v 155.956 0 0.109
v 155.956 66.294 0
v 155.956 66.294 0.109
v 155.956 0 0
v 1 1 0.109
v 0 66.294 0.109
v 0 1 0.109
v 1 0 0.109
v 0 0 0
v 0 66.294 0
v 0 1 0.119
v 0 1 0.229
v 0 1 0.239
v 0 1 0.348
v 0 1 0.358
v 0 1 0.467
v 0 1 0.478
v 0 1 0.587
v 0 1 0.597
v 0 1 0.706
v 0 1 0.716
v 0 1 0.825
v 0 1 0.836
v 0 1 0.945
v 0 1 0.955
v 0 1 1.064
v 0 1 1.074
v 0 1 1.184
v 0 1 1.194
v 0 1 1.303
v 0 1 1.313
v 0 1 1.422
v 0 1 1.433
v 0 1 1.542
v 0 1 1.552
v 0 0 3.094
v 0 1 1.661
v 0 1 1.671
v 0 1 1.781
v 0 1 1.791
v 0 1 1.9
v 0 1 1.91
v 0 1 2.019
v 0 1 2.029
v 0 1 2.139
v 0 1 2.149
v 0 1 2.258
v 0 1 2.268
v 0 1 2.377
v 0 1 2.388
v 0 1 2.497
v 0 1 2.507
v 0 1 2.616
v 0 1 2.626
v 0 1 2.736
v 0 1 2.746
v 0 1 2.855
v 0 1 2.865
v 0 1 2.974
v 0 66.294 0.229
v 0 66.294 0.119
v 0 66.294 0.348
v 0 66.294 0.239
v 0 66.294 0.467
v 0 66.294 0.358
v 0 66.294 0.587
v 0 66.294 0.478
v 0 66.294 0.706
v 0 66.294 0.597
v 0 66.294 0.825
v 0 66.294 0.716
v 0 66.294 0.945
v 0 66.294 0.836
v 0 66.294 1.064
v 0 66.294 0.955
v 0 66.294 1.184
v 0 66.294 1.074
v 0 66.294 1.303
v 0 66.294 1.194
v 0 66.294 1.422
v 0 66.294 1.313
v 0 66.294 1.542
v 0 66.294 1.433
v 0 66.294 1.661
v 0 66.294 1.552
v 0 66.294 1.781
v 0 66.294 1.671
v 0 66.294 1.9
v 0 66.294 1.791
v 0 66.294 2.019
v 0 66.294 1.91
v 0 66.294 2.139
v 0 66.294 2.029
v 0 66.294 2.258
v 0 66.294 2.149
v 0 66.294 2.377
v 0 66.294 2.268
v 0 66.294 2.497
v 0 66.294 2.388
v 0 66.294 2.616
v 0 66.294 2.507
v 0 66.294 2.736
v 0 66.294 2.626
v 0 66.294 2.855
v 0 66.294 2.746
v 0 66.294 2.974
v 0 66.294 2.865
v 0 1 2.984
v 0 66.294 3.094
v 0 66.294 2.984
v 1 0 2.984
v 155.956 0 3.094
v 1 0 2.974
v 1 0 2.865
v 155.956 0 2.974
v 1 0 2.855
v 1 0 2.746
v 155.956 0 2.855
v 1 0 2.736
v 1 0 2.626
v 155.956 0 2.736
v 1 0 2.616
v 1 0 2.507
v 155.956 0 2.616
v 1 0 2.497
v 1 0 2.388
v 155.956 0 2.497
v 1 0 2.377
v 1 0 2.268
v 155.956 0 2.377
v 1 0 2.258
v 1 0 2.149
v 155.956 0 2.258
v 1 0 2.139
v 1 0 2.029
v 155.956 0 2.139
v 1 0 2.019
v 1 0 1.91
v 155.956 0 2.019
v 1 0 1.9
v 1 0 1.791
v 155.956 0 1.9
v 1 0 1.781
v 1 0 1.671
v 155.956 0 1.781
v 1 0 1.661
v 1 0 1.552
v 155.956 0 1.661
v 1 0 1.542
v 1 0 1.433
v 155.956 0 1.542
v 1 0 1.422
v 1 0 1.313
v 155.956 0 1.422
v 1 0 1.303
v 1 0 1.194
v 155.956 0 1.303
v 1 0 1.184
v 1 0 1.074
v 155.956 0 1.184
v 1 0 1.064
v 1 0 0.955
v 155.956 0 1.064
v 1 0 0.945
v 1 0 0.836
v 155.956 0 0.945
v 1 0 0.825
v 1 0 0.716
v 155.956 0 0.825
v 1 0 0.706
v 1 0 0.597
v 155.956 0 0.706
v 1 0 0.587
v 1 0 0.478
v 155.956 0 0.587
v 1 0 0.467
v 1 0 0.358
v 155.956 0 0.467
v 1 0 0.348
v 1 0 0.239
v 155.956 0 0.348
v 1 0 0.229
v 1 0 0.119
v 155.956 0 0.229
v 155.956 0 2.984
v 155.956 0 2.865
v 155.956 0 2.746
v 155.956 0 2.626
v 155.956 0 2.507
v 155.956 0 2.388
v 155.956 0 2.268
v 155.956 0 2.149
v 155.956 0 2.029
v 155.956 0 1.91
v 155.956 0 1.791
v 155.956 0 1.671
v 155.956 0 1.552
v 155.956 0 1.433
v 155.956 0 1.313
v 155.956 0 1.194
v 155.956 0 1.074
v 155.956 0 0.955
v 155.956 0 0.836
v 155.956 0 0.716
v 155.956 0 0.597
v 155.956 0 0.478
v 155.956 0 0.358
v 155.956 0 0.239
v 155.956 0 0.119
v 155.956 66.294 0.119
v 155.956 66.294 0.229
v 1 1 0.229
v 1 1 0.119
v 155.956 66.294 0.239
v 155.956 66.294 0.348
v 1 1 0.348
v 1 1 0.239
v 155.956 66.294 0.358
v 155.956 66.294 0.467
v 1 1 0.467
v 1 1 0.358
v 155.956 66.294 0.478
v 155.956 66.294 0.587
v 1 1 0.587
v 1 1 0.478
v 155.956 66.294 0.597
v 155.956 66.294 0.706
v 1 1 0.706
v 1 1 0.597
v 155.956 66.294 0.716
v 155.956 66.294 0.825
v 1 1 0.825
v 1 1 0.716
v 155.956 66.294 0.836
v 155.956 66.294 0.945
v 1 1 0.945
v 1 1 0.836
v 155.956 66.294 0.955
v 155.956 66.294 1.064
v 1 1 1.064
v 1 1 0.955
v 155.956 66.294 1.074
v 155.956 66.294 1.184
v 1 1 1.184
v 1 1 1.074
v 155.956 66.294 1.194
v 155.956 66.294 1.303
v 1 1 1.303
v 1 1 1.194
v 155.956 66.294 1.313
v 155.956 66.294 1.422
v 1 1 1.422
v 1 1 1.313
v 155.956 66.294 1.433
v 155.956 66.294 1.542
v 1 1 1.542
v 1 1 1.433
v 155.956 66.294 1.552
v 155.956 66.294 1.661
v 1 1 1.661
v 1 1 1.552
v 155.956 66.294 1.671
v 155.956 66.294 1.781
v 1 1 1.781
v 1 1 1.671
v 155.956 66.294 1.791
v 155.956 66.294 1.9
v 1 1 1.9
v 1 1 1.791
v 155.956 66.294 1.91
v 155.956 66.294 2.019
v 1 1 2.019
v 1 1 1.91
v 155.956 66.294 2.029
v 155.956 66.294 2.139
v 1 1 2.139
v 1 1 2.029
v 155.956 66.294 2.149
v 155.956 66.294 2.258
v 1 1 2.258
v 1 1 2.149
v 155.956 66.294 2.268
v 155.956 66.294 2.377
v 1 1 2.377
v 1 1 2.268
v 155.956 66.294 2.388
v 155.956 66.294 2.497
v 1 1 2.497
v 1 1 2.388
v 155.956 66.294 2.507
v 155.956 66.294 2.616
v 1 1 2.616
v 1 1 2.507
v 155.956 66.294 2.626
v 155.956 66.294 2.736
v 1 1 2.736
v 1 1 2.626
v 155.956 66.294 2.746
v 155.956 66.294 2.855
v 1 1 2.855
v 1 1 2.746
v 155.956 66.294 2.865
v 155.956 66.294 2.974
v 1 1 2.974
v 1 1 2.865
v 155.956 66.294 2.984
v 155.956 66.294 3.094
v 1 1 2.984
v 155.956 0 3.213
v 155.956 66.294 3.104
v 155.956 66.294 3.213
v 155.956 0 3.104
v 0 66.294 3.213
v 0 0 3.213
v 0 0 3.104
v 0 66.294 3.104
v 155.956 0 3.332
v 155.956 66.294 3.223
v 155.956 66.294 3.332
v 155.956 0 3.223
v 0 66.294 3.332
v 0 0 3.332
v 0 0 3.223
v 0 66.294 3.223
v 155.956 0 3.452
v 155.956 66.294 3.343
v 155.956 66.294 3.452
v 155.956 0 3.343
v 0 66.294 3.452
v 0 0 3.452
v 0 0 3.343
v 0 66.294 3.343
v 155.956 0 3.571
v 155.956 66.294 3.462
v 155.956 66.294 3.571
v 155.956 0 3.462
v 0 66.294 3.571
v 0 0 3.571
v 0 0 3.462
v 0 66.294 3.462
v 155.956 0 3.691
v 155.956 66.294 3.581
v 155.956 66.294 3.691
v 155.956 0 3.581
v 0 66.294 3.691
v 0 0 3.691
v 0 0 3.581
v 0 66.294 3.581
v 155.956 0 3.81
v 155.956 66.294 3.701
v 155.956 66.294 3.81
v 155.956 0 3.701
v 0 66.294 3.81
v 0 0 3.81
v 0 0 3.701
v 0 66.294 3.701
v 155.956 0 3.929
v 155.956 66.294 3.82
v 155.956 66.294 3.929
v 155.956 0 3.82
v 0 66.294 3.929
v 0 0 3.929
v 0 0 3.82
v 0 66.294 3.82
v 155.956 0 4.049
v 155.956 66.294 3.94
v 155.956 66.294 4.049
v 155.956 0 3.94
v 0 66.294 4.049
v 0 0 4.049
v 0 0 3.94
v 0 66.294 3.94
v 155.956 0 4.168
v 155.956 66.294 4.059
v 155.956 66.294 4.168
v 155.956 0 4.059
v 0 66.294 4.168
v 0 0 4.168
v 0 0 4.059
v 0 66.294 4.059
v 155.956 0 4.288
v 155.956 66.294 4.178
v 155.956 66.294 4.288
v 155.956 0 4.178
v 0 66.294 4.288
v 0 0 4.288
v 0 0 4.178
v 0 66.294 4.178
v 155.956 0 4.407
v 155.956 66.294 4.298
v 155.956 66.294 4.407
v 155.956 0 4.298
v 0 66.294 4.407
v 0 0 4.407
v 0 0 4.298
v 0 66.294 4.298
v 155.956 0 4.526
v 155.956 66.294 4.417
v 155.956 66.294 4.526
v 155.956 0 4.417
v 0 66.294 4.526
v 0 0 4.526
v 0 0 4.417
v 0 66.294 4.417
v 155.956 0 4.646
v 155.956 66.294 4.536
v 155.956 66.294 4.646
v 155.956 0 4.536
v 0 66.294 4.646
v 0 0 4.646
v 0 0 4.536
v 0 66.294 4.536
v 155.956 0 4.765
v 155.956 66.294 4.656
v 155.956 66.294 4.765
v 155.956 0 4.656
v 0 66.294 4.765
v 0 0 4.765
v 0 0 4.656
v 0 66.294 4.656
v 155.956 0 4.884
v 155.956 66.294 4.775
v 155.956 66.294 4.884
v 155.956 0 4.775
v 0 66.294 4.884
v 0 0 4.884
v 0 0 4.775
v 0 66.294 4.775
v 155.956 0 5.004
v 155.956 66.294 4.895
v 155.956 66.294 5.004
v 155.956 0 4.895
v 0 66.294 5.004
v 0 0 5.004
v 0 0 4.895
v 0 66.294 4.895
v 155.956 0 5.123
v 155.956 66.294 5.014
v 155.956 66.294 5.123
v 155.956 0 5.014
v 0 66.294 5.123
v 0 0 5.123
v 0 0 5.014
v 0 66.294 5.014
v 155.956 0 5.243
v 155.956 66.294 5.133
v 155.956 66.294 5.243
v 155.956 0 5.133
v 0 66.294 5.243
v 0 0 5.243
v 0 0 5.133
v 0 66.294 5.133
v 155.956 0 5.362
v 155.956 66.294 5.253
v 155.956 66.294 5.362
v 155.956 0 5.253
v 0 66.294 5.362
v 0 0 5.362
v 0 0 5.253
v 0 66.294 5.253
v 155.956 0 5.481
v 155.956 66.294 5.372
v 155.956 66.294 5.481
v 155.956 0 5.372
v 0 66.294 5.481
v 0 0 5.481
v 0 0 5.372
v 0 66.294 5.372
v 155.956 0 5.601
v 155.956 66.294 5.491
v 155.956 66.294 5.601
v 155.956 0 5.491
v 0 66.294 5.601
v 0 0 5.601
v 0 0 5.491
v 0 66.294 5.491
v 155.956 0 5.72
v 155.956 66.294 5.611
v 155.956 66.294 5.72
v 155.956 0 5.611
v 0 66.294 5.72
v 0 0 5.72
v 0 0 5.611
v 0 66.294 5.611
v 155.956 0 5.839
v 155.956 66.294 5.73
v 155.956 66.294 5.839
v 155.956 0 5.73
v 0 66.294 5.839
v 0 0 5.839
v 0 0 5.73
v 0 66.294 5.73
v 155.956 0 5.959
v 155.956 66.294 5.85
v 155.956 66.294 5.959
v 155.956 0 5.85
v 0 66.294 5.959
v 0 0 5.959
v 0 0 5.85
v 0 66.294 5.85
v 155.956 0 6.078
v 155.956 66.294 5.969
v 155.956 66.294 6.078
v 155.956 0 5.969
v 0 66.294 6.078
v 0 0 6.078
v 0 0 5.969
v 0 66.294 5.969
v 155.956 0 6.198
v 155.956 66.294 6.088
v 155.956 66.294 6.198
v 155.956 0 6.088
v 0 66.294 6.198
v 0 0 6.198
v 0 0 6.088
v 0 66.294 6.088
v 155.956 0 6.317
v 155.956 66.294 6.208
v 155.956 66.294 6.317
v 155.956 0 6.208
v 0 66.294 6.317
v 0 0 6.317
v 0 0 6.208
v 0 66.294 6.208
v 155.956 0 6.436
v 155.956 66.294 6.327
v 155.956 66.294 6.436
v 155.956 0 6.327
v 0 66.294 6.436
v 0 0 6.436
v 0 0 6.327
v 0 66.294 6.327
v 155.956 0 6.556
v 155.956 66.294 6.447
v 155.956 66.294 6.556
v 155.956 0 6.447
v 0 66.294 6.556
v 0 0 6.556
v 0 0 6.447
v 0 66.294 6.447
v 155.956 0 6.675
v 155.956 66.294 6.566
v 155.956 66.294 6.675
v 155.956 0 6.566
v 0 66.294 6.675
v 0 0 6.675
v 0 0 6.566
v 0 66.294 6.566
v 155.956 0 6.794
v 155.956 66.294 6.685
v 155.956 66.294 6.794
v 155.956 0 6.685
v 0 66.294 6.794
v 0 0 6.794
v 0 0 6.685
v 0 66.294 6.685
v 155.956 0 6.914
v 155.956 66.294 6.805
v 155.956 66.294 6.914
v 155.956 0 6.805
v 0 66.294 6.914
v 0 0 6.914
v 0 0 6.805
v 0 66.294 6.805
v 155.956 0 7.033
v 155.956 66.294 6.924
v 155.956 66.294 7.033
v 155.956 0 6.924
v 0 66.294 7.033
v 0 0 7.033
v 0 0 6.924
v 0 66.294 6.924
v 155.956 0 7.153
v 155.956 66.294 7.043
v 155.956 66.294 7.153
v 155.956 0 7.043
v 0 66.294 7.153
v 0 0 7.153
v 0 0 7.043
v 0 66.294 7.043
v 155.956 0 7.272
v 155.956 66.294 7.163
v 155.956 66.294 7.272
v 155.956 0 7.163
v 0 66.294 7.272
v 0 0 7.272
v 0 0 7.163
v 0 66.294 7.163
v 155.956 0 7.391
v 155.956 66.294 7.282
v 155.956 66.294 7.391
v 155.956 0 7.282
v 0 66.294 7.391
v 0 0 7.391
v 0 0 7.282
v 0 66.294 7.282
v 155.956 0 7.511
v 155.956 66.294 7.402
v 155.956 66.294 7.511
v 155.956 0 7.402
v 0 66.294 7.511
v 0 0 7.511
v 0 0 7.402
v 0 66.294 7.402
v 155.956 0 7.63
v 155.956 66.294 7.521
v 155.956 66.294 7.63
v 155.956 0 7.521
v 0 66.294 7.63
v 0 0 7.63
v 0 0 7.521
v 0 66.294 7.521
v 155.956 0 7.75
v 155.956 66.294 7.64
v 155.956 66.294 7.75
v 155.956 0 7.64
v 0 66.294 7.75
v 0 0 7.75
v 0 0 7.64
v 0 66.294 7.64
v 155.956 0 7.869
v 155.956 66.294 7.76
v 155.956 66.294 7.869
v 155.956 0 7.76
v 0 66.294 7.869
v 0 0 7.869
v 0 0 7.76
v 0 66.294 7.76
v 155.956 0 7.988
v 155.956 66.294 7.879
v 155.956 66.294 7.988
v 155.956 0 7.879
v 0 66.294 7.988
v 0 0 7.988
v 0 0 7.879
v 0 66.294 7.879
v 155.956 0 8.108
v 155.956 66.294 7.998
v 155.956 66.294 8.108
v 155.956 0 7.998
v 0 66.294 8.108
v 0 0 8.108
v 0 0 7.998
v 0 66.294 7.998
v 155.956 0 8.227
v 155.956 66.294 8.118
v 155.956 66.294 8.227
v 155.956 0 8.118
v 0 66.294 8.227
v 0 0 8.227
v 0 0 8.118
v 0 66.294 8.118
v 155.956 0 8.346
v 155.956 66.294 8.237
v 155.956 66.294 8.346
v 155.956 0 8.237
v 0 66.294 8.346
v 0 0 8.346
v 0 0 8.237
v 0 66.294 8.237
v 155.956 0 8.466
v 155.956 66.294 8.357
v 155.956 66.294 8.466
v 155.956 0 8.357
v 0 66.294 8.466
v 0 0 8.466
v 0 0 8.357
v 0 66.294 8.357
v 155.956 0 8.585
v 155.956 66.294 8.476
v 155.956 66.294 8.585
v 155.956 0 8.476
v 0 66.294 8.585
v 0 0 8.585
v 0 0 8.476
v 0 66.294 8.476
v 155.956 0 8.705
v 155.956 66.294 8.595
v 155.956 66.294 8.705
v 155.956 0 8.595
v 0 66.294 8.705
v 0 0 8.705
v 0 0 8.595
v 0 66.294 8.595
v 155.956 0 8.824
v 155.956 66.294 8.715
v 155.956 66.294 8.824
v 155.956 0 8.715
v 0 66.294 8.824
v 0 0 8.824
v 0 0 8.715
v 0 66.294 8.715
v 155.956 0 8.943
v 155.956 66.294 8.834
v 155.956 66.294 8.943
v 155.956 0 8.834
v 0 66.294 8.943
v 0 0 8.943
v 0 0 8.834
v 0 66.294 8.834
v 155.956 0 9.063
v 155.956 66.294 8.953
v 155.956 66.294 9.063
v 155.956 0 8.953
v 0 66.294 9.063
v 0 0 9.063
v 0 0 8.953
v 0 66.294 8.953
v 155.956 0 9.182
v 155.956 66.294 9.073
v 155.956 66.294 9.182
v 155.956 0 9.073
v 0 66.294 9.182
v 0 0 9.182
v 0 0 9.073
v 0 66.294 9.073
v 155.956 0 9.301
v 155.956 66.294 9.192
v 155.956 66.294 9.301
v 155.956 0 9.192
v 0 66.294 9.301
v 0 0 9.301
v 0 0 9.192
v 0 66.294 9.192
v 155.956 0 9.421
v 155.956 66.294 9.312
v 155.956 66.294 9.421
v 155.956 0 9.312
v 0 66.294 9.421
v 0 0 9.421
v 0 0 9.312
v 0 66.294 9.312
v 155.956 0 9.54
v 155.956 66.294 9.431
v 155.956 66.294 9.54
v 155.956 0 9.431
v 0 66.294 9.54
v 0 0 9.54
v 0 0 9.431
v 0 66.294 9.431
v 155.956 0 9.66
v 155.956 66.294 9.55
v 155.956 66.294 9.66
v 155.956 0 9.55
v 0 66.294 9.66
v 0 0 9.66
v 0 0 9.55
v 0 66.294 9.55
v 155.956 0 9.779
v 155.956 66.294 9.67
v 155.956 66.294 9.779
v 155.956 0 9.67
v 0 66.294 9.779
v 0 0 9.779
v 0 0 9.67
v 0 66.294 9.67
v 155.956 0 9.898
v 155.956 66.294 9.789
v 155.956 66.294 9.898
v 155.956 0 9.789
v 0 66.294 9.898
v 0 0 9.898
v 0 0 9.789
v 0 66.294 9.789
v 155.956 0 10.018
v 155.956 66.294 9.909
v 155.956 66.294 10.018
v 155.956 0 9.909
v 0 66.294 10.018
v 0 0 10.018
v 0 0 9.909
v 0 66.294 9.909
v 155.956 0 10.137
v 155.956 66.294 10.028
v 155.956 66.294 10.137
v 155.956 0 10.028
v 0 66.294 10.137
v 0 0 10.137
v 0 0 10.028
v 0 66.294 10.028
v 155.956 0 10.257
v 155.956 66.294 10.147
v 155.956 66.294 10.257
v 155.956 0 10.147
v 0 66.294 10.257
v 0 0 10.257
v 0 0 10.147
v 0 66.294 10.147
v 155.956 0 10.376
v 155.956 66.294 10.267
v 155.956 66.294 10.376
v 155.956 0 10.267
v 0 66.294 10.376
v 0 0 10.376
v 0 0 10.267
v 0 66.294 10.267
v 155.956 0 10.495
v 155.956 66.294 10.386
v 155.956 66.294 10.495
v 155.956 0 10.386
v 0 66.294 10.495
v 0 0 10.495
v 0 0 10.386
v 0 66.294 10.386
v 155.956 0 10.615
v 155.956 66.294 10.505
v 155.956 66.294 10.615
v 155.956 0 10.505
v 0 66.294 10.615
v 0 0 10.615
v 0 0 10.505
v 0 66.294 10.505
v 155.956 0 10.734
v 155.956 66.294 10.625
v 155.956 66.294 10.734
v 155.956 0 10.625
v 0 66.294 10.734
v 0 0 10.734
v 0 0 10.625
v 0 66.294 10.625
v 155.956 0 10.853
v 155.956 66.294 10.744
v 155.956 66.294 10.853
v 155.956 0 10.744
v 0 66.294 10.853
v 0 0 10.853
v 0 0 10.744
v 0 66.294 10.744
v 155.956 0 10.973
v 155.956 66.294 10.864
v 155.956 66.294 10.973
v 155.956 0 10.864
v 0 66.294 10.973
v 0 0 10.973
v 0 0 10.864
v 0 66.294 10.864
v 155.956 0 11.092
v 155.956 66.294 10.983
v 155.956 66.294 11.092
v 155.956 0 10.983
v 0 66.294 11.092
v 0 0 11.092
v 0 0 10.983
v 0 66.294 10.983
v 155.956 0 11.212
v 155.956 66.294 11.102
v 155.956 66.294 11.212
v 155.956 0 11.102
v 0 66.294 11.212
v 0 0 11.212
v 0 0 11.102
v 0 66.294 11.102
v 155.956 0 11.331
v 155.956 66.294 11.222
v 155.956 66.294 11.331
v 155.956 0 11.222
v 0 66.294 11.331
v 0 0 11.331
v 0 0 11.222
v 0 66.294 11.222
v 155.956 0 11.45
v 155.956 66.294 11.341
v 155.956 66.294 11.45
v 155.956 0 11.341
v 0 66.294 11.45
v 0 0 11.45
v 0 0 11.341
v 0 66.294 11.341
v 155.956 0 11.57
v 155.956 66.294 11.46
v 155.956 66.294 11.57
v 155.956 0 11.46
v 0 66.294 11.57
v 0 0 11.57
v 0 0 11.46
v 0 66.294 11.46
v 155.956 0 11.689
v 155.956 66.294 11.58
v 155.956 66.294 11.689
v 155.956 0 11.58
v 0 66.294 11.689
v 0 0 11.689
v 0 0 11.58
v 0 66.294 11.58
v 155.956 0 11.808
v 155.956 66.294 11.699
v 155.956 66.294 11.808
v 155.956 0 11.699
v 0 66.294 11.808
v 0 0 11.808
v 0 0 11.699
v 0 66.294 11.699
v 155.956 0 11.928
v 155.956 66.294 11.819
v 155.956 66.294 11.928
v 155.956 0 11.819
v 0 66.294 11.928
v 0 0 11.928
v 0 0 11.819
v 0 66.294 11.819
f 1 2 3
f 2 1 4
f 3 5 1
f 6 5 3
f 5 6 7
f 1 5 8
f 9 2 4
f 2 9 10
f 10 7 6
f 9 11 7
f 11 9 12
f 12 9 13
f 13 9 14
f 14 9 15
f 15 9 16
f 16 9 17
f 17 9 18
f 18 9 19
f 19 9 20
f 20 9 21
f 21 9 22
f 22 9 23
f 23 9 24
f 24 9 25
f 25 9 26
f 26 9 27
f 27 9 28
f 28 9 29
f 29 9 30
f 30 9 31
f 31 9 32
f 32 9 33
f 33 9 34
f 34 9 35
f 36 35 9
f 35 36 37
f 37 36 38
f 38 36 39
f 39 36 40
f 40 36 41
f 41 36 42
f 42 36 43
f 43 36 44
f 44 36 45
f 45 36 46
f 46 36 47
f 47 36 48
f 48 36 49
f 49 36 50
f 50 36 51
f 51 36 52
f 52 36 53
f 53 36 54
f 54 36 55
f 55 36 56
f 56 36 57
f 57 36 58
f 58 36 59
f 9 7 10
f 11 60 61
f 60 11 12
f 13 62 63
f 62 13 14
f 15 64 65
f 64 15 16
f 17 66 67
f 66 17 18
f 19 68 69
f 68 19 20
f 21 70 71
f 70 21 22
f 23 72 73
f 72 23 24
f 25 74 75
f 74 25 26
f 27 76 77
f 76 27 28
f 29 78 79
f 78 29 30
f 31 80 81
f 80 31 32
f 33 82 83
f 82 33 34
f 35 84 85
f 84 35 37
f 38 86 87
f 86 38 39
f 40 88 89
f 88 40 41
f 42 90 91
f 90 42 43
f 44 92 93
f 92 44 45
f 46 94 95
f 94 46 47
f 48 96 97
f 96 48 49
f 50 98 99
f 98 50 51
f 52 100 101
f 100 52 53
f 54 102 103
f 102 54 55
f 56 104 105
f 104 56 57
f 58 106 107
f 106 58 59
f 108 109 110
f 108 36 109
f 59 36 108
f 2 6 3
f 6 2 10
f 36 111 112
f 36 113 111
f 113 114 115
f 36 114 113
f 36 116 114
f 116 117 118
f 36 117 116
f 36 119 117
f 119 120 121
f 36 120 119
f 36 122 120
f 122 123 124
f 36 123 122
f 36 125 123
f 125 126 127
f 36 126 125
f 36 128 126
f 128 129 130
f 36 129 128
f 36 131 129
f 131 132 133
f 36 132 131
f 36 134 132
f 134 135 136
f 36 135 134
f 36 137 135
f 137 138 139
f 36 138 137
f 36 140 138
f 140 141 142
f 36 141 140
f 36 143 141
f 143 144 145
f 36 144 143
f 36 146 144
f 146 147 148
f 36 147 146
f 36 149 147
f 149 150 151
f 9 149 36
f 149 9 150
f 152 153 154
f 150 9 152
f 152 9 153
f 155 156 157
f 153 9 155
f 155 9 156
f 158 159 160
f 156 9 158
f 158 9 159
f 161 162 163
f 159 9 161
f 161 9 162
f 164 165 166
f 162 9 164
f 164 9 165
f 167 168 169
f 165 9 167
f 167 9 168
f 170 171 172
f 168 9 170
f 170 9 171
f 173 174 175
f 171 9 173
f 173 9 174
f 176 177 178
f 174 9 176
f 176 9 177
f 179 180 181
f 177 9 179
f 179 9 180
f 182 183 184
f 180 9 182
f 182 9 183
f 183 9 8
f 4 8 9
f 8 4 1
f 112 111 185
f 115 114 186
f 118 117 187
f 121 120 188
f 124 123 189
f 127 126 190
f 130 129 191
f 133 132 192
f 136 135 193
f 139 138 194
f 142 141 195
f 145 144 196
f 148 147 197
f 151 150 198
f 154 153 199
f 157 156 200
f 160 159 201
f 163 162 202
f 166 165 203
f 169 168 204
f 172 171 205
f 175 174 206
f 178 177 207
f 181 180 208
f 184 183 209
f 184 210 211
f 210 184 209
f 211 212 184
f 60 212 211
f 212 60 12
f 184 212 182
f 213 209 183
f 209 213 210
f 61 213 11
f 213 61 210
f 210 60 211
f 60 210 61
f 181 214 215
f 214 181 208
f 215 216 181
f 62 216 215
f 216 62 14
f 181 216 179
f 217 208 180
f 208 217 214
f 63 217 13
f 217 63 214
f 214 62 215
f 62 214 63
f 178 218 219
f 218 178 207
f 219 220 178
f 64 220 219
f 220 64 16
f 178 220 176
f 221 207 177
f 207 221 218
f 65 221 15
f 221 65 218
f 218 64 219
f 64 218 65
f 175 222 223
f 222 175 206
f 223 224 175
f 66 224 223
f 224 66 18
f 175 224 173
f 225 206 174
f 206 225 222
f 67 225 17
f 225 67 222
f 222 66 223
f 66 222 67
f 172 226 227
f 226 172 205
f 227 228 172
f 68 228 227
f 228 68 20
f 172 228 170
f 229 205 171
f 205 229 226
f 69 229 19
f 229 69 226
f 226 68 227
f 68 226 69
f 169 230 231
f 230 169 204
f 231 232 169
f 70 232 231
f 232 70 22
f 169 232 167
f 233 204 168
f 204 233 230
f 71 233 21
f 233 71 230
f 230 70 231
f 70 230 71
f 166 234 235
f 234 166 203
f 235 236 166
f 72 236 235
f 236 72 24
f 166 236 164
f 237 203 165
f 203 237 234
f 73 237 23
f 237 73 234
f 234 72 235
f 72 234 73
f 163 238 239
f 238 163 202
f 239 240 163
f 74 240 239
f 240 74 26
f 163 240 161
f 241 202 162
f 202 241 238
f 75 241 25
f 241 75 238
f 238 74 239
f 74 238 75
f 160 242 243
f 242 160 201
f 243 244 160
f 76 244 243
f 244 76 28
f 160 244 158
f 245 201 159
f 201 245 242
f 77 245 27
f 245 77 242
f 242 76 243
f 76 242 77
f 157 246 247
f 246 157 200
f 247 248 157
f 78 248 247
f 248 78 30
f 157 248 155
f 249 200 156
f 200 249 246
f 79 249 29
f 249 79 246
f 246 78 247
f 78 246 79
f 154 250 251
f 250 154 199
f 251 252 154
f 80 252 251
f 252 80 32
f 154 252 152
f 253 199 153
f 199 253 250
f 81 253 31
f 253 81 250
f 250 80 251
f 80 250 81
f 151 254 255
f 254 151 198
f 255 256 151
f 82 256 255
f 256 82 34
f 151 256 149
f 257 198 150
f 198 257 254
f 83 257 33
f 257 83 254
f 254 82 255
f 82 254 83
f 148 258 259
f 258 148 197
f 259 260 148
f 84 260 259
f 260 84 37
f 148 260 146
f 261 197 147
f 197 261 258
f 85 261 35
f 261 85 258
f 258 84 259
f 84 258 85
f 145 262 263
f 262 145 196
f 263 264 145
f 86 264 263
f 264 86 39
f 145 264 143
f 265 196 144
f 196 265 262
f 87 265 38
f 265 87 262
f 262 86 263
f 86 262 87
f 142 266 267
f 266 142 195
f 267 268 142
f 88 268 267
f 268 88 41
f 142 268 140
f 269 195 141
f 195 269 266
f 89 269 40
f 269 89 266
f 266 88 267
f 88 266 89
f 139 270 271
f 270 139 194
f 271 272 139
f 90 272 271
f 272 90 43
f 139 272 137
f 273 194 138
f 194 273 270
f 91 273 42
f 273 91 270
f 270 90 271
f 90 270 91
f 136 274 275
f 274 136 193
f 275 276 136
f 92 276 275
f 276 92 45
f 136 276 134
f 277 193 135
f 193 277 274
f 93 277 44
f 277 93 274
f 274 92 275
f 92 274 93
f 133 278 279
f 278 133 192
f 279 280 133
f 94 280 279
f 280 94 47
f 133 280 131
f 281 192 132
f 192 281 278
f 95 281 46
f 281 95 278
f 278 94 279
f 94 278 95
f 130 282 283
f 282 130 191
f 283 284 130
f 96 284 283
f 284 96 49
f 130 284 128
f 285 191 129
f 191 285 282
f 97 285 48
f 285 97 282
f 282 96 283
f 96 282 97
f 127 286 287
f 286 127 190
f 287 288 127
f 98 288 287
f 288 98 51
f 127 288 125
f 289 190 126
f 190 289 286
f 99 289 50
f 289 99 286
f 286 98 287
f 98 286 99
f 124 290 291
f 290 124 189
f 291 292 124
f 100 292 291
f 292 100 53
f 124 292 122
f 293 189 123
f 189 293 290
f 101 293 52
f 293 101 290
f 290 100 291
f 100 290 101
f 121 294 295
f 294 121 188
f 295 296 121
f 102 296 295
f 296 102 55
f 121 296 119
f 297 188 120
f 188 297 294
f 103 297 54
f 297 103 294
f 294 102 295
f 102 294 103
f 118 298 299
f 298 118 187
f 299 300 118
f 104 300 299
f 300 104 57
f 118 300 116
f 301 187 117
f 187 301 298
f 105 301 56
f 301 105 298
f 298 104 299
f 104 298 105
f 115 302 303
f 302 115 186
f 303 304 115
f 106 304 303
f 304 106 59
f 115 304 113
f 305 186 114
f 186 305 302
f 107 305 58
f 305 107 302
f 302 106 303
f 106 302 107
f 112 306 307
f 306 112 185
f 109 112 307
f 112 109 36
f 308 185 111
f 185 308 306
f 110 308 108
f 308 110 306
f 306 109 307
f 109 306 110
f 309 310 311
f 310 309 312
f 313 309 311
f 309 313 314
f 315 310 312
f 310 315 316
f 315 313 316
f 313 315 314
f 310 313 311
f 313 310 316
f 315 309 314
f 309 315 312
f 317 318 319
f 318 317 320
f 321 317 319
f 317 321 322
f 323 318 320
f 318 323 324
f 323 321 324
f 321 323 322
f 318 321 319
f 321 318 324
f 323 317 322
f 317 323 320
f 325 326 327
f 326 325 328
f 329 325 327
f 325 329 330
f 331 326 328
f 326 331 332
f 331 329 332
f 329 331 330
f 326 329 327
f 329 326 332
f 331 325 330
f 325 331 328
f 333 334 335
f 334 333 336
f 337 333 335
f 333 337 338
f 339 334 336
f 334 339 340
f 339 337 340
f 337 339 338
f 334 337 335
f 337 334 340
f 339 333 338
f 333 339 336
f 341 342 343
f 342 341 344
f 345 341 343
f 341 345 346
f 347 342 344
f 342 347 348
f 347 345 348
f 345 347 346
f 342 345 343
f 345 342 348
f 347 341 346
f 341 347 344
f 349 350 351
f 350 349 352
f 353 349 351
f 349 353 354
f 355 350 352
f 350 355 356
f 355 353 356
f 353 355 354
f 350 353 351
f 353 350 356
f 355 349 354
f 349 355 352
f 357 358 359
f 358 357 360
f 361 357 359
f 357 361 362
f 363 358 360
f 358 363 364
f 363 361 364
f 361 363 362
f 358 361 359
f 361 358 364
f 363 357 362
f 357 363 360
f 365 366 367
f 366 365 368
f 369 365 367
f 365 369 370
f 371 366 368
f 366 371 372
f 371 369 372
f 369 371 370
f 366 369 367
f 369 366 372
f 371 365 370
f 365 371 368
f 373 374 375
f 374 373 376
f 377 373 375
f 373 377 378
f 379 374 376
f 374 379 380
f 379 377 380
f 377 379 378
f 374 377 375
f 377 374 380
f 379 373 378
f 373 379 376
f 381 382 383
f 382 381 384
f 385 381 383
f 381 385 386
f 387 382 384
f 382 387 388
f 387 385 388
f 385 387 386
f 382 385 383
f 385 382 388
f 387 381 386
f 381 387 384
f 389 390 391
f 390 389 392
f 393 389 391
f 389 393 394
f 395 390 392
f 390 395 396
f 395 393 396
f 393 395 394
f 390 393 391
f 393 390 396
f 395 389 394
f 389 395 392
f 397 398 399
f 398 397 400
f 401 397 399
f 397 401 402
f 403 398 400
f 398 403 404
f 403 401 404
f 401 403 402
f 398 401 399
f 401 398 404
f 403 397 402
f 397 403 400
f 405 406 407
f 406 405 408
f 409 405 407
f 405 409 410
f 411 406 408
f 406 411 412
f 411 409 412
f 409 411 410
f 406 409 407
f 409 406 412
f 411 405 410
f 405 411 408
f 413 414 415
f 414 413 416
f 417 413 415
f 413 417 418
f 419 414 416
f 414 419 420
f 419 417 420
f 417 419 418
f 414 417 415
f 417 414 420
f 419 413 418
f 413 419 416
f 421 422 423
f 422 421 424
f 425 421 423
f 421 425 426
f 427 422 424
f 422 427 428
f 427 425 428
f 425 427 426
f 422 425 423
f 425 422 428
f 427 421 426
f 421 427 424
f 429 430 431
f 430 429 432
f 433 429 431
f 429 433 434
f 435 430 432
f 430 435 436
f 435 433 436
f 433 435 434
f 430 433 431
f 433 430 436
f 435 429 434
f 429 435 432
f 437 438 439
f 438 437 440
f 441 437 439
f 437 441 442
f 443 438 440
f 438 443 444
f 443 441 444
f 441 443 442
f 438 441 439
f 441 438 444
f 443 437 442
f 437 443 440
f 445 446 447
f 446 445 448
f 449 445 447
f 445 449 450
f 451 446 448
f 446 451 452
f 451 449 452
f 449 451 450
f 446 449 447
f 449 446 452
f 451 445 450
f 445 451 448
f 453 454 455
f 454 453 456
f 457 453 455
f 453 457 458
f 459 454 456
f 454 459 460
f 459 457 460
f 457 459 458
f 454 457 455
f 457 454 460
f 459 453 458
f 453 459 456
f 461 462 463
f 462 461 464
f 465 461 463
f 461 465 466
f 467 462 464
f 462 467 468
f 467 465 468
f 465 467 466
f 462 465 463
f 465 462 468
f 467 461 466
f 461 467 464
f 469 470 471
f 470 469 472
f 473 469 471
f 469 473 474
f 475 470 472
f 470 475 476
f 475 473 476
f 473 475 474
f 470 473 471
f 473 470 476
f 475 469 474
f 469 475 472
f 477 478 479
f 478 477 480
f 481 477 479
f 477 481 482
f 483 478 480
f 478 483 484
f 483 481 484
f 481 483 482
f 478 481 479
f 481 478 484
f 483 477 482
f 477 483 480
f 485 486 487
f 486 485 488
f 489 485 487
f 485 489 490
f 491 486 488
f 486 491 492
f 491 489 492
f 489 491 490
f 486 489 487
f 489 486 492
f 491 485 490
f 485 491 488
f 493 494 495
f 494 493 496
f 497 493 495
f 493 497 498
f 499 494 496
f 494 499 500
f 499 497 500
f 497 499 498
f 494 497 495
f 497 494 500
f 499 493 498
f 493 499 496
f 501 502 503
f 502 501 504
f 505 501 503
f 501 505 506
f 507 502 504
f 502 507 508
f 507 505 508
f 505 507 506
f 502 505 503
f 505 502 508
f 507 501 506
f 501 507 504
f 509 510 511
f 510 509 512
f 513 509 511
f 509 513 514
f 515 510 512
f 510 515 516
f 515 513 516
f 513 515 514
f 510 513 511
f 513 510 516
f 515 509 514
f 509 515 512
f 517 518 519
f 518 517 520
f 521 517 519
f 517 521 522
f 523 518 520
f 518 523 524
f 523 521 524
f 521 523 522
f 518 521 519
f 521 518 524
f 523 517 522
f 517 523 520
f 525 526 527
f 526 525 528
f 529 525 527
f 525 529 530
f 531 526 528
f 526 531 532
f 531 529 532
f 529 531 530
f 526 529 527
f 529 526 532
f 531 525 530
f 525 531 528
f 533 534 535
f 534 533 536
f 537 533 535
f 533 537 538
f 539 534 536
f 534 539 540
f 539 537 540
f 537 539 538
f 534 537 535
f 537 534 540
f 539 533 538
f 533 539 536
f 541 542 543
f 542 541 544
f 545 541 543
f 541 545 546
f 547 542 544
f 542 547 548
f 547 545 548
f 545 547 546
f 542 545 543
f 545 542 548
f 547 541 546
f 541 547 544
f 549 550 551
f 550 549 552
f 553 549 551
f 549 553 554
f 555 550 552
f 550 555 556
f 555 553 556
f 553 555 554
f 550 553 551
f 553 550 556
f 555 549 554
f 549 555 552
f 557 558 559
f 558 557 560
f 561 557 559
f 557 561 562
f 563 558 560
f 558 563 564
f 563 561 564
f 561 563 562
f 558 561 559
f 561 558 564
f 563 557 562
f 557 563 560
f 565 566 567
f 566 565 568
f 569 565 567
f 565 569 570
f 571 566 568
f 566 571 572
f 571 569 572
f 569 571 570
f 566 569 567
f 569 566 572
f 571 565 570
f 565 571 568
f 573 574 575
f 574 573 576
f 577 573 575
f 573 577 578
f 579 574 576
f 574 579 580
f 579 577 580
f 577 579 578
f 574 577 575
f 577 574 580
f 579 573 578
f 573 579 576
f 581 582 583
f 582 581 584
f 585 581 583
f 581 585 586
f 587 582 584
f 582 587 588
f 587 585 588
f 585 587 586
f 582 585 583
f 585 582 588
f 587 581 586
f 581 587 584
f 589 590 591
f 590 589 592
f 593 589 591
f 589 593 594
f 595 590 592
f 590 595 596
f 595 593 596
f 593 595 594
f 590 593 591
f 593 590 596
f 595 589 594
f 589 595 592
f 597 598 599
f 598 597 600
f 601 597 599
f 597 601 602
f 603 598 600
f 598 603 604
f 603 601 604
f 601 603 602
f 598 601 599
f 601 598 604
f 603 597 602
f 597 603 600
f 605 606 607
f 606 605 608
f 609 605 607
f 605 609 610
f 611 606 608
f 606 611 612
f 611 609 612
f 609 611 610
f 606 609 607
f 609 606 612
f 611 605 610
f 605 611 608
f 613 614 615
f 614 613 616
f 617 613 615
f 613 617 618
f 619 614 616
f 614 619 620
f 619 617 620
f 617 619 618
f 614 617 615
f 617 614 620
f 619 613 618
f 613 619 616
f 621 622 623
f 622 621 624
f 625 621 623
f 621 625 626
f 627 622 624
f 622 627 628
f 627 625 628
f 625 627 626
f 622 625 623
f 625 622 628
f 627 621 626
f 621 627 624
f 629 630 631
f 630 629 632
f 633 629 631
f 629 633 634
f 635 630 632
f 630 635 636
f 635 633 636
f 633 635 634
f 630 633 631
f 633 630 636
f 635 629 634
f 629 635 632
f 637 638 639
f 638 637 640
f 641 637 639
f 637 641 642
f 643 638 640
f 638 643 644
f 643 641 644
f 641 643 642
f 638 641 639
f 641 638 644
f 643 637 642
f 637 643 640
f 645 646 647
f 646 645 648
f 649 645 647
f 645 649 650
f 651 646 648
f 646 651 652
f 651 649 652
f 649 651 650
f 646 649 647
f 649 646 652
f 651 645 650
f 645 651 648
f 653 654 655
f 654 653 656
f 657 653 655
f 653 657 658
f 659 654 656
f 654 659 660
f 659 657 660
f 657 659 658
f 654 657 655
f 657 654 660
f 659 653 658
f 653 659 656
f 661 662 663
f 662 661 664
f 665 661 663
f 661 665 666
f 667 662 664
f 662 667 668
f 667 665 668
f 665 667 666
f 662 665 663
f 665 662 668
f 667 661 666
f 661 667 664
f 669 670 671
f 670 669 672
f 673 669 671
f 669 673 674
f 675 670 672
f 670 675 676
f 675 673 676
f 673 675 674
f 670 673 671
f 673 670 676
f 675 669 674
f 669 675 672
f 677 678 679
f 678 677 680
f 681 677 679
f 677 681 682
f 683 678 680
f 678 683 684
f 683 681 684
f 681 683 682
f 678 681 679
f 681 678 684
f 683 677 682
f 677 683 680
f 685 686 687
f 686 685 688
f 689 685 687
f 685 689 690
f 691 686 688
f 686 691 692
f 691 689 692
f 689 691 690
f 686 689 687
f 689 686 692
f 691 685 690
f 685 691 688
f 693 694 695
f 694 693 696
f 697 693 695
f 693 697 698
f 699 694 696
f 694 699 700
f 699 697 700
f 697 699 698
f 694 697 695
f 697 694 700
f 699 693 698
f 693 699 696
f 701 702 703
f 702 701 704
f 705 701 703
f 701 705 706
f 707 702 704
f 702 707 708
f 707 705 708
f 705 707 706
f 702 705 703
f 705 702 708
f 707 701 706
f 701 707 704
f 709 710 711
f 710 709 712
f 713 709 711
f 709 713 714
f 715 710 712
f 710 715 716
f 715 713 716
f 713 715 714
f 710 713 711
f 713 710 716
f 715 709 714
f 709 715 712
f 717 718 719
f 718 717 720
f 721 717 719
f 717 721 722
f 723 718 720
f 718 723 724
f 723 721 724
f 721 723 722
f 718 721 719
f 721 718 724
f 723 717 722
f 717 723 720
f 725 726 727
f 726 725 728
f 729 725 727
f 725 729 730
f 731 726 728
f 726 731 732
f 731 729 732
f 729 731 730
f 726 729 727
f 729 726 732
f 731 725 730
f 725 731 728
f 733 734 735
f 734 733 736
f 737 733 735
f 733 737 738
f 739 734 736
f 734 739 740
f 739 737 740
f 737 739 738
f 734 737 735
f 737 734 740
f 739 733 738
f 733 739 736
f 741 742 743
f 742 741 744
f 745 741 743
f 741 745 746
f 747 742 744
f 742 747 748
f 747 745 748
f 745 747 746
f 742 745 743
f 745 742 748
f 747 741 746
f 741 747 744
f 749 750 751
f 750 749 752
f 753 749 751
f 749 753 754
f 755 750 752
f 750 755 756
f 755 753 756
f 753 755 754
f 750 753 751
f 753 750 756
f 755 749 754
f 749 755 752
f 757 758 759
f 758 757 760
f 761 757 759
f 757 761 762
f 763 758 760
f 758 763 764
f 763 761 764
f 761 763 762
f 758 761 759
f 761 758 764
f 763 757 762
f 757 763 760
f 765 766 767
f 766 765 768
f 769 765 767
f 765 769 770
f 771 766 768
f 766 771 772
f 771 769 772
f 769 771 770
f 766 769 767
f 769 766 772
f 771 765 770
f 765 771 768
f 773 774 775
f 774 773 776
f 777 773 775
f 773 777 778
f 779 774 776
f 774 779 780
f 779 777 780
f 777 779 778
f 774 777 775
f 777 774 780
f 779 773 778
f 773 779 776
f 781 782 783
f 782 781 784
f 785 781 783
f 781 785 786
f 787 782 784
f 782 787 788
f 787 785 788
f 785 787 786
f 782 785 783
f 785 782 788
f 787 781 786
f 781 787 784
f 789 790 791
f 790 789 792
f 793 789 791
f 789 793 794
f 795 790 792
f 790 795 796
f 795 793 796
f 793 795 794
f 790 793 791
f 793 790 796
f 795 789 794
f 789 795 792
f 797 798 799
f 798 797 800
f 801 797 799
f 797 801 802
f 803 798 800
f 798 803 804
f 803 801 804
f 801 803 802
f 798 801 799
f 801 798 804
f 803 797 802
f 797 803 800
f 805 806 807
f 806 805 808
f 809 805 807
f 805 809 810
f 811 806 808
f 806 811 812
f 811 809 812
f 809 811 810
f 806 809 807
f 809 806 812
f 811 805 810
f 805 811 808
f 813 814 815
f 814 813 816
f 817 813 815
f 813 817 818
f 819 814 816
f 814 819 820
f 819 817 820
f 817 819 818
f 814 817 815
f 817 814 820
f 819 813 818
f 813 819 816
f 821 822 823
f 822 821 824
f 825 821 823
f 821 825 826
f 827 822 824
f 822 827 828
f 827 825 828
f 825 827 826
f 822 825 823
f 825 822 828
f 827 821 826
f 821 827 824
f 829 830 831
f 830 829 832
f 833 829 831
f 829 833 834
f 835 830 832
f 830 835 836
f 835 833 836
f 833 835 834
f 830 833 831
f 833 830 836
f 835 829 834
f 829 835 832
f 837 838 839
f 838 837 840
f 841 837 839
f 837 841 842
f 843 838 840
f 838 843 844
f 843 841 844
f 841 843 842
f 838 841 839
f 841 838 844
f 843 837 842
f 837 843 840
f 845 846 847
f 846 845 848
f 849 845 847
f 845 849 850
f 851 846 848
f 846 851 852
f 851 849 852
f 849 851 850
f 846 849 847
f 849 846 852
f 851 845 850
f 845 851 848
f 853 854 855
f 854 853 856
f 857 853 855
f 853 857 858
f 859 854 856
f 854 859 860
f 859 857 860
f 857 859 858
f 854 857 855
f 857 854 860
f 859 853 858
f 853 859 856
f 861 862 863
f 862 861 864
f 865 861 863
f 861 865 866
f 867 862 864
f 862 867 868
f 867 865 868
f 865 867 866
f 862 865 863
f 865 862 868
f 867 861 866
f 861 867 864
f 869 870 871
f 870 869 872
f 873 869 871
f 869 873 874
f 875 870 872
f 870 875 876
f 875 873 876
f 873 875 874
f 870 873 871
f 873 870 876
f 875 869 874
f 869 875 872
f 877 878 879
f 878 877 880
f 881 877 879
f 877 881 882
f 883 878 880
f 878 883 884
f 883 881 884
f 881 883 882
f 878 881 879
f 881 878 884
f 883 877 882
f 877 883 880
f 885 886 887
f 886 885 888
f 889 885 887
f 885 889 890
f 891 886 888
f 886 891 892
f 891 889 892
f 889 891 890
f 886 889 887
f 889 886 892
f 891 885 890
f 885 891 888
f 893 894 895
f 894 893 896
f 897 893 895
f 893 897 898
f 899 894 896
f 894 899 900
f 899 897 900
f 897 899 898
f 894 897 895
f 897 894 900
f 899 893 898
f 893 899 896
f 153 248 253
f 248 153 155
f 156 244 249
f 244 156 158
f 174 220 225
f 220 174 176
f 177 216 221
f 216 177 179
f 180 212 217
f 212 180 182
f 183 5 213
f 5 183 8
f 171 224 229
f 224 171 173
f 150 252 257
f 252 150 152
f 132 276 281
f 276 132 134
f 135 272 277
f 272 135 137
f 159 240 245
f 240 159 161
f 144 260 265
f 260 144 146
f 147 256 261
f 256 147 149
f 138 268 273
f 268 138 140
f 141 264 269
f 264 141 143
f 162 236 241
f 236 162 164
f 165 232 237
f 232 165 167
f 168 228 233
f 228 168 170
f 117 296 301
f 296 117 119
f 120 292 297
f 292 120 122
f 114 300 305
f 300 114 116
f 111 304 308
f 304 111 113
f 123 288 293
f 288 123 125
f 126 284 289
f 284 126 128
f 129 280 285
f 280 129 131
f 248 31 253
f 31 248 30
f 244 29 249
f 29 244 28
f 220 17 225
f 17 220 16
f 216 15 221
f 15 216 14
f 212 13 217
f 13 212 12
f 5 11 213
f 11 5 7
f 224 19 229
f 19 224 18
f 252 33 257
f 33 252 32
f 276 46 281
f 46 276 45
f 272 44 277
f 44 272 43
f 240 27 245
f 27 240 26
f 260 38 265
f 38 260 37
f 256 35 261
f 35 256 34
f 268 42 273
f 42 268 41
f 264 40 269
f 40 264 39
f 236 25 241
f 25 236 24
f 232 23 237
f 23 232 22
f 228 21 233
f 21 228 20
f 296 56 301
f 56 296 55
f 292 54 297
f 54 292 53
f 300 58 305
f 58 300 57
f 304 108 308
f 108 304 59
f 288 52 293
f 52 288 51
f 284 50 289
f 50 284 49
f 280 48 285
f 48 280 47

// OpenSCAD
inch=25.4;
bill_length=6.14*inch;
bill_width=2.61*inch;
bill_thickness=0.0043*inch;

shell=1.6;

comfort=0.0035*inch*2.5;

for(i=[0:100-1]){
    translate([0,0,i*(bill_thickness+0.00040*inch)])
    cube([bill_length,bill_width,bill_thickness]);
}

cube([1,1,3]);
